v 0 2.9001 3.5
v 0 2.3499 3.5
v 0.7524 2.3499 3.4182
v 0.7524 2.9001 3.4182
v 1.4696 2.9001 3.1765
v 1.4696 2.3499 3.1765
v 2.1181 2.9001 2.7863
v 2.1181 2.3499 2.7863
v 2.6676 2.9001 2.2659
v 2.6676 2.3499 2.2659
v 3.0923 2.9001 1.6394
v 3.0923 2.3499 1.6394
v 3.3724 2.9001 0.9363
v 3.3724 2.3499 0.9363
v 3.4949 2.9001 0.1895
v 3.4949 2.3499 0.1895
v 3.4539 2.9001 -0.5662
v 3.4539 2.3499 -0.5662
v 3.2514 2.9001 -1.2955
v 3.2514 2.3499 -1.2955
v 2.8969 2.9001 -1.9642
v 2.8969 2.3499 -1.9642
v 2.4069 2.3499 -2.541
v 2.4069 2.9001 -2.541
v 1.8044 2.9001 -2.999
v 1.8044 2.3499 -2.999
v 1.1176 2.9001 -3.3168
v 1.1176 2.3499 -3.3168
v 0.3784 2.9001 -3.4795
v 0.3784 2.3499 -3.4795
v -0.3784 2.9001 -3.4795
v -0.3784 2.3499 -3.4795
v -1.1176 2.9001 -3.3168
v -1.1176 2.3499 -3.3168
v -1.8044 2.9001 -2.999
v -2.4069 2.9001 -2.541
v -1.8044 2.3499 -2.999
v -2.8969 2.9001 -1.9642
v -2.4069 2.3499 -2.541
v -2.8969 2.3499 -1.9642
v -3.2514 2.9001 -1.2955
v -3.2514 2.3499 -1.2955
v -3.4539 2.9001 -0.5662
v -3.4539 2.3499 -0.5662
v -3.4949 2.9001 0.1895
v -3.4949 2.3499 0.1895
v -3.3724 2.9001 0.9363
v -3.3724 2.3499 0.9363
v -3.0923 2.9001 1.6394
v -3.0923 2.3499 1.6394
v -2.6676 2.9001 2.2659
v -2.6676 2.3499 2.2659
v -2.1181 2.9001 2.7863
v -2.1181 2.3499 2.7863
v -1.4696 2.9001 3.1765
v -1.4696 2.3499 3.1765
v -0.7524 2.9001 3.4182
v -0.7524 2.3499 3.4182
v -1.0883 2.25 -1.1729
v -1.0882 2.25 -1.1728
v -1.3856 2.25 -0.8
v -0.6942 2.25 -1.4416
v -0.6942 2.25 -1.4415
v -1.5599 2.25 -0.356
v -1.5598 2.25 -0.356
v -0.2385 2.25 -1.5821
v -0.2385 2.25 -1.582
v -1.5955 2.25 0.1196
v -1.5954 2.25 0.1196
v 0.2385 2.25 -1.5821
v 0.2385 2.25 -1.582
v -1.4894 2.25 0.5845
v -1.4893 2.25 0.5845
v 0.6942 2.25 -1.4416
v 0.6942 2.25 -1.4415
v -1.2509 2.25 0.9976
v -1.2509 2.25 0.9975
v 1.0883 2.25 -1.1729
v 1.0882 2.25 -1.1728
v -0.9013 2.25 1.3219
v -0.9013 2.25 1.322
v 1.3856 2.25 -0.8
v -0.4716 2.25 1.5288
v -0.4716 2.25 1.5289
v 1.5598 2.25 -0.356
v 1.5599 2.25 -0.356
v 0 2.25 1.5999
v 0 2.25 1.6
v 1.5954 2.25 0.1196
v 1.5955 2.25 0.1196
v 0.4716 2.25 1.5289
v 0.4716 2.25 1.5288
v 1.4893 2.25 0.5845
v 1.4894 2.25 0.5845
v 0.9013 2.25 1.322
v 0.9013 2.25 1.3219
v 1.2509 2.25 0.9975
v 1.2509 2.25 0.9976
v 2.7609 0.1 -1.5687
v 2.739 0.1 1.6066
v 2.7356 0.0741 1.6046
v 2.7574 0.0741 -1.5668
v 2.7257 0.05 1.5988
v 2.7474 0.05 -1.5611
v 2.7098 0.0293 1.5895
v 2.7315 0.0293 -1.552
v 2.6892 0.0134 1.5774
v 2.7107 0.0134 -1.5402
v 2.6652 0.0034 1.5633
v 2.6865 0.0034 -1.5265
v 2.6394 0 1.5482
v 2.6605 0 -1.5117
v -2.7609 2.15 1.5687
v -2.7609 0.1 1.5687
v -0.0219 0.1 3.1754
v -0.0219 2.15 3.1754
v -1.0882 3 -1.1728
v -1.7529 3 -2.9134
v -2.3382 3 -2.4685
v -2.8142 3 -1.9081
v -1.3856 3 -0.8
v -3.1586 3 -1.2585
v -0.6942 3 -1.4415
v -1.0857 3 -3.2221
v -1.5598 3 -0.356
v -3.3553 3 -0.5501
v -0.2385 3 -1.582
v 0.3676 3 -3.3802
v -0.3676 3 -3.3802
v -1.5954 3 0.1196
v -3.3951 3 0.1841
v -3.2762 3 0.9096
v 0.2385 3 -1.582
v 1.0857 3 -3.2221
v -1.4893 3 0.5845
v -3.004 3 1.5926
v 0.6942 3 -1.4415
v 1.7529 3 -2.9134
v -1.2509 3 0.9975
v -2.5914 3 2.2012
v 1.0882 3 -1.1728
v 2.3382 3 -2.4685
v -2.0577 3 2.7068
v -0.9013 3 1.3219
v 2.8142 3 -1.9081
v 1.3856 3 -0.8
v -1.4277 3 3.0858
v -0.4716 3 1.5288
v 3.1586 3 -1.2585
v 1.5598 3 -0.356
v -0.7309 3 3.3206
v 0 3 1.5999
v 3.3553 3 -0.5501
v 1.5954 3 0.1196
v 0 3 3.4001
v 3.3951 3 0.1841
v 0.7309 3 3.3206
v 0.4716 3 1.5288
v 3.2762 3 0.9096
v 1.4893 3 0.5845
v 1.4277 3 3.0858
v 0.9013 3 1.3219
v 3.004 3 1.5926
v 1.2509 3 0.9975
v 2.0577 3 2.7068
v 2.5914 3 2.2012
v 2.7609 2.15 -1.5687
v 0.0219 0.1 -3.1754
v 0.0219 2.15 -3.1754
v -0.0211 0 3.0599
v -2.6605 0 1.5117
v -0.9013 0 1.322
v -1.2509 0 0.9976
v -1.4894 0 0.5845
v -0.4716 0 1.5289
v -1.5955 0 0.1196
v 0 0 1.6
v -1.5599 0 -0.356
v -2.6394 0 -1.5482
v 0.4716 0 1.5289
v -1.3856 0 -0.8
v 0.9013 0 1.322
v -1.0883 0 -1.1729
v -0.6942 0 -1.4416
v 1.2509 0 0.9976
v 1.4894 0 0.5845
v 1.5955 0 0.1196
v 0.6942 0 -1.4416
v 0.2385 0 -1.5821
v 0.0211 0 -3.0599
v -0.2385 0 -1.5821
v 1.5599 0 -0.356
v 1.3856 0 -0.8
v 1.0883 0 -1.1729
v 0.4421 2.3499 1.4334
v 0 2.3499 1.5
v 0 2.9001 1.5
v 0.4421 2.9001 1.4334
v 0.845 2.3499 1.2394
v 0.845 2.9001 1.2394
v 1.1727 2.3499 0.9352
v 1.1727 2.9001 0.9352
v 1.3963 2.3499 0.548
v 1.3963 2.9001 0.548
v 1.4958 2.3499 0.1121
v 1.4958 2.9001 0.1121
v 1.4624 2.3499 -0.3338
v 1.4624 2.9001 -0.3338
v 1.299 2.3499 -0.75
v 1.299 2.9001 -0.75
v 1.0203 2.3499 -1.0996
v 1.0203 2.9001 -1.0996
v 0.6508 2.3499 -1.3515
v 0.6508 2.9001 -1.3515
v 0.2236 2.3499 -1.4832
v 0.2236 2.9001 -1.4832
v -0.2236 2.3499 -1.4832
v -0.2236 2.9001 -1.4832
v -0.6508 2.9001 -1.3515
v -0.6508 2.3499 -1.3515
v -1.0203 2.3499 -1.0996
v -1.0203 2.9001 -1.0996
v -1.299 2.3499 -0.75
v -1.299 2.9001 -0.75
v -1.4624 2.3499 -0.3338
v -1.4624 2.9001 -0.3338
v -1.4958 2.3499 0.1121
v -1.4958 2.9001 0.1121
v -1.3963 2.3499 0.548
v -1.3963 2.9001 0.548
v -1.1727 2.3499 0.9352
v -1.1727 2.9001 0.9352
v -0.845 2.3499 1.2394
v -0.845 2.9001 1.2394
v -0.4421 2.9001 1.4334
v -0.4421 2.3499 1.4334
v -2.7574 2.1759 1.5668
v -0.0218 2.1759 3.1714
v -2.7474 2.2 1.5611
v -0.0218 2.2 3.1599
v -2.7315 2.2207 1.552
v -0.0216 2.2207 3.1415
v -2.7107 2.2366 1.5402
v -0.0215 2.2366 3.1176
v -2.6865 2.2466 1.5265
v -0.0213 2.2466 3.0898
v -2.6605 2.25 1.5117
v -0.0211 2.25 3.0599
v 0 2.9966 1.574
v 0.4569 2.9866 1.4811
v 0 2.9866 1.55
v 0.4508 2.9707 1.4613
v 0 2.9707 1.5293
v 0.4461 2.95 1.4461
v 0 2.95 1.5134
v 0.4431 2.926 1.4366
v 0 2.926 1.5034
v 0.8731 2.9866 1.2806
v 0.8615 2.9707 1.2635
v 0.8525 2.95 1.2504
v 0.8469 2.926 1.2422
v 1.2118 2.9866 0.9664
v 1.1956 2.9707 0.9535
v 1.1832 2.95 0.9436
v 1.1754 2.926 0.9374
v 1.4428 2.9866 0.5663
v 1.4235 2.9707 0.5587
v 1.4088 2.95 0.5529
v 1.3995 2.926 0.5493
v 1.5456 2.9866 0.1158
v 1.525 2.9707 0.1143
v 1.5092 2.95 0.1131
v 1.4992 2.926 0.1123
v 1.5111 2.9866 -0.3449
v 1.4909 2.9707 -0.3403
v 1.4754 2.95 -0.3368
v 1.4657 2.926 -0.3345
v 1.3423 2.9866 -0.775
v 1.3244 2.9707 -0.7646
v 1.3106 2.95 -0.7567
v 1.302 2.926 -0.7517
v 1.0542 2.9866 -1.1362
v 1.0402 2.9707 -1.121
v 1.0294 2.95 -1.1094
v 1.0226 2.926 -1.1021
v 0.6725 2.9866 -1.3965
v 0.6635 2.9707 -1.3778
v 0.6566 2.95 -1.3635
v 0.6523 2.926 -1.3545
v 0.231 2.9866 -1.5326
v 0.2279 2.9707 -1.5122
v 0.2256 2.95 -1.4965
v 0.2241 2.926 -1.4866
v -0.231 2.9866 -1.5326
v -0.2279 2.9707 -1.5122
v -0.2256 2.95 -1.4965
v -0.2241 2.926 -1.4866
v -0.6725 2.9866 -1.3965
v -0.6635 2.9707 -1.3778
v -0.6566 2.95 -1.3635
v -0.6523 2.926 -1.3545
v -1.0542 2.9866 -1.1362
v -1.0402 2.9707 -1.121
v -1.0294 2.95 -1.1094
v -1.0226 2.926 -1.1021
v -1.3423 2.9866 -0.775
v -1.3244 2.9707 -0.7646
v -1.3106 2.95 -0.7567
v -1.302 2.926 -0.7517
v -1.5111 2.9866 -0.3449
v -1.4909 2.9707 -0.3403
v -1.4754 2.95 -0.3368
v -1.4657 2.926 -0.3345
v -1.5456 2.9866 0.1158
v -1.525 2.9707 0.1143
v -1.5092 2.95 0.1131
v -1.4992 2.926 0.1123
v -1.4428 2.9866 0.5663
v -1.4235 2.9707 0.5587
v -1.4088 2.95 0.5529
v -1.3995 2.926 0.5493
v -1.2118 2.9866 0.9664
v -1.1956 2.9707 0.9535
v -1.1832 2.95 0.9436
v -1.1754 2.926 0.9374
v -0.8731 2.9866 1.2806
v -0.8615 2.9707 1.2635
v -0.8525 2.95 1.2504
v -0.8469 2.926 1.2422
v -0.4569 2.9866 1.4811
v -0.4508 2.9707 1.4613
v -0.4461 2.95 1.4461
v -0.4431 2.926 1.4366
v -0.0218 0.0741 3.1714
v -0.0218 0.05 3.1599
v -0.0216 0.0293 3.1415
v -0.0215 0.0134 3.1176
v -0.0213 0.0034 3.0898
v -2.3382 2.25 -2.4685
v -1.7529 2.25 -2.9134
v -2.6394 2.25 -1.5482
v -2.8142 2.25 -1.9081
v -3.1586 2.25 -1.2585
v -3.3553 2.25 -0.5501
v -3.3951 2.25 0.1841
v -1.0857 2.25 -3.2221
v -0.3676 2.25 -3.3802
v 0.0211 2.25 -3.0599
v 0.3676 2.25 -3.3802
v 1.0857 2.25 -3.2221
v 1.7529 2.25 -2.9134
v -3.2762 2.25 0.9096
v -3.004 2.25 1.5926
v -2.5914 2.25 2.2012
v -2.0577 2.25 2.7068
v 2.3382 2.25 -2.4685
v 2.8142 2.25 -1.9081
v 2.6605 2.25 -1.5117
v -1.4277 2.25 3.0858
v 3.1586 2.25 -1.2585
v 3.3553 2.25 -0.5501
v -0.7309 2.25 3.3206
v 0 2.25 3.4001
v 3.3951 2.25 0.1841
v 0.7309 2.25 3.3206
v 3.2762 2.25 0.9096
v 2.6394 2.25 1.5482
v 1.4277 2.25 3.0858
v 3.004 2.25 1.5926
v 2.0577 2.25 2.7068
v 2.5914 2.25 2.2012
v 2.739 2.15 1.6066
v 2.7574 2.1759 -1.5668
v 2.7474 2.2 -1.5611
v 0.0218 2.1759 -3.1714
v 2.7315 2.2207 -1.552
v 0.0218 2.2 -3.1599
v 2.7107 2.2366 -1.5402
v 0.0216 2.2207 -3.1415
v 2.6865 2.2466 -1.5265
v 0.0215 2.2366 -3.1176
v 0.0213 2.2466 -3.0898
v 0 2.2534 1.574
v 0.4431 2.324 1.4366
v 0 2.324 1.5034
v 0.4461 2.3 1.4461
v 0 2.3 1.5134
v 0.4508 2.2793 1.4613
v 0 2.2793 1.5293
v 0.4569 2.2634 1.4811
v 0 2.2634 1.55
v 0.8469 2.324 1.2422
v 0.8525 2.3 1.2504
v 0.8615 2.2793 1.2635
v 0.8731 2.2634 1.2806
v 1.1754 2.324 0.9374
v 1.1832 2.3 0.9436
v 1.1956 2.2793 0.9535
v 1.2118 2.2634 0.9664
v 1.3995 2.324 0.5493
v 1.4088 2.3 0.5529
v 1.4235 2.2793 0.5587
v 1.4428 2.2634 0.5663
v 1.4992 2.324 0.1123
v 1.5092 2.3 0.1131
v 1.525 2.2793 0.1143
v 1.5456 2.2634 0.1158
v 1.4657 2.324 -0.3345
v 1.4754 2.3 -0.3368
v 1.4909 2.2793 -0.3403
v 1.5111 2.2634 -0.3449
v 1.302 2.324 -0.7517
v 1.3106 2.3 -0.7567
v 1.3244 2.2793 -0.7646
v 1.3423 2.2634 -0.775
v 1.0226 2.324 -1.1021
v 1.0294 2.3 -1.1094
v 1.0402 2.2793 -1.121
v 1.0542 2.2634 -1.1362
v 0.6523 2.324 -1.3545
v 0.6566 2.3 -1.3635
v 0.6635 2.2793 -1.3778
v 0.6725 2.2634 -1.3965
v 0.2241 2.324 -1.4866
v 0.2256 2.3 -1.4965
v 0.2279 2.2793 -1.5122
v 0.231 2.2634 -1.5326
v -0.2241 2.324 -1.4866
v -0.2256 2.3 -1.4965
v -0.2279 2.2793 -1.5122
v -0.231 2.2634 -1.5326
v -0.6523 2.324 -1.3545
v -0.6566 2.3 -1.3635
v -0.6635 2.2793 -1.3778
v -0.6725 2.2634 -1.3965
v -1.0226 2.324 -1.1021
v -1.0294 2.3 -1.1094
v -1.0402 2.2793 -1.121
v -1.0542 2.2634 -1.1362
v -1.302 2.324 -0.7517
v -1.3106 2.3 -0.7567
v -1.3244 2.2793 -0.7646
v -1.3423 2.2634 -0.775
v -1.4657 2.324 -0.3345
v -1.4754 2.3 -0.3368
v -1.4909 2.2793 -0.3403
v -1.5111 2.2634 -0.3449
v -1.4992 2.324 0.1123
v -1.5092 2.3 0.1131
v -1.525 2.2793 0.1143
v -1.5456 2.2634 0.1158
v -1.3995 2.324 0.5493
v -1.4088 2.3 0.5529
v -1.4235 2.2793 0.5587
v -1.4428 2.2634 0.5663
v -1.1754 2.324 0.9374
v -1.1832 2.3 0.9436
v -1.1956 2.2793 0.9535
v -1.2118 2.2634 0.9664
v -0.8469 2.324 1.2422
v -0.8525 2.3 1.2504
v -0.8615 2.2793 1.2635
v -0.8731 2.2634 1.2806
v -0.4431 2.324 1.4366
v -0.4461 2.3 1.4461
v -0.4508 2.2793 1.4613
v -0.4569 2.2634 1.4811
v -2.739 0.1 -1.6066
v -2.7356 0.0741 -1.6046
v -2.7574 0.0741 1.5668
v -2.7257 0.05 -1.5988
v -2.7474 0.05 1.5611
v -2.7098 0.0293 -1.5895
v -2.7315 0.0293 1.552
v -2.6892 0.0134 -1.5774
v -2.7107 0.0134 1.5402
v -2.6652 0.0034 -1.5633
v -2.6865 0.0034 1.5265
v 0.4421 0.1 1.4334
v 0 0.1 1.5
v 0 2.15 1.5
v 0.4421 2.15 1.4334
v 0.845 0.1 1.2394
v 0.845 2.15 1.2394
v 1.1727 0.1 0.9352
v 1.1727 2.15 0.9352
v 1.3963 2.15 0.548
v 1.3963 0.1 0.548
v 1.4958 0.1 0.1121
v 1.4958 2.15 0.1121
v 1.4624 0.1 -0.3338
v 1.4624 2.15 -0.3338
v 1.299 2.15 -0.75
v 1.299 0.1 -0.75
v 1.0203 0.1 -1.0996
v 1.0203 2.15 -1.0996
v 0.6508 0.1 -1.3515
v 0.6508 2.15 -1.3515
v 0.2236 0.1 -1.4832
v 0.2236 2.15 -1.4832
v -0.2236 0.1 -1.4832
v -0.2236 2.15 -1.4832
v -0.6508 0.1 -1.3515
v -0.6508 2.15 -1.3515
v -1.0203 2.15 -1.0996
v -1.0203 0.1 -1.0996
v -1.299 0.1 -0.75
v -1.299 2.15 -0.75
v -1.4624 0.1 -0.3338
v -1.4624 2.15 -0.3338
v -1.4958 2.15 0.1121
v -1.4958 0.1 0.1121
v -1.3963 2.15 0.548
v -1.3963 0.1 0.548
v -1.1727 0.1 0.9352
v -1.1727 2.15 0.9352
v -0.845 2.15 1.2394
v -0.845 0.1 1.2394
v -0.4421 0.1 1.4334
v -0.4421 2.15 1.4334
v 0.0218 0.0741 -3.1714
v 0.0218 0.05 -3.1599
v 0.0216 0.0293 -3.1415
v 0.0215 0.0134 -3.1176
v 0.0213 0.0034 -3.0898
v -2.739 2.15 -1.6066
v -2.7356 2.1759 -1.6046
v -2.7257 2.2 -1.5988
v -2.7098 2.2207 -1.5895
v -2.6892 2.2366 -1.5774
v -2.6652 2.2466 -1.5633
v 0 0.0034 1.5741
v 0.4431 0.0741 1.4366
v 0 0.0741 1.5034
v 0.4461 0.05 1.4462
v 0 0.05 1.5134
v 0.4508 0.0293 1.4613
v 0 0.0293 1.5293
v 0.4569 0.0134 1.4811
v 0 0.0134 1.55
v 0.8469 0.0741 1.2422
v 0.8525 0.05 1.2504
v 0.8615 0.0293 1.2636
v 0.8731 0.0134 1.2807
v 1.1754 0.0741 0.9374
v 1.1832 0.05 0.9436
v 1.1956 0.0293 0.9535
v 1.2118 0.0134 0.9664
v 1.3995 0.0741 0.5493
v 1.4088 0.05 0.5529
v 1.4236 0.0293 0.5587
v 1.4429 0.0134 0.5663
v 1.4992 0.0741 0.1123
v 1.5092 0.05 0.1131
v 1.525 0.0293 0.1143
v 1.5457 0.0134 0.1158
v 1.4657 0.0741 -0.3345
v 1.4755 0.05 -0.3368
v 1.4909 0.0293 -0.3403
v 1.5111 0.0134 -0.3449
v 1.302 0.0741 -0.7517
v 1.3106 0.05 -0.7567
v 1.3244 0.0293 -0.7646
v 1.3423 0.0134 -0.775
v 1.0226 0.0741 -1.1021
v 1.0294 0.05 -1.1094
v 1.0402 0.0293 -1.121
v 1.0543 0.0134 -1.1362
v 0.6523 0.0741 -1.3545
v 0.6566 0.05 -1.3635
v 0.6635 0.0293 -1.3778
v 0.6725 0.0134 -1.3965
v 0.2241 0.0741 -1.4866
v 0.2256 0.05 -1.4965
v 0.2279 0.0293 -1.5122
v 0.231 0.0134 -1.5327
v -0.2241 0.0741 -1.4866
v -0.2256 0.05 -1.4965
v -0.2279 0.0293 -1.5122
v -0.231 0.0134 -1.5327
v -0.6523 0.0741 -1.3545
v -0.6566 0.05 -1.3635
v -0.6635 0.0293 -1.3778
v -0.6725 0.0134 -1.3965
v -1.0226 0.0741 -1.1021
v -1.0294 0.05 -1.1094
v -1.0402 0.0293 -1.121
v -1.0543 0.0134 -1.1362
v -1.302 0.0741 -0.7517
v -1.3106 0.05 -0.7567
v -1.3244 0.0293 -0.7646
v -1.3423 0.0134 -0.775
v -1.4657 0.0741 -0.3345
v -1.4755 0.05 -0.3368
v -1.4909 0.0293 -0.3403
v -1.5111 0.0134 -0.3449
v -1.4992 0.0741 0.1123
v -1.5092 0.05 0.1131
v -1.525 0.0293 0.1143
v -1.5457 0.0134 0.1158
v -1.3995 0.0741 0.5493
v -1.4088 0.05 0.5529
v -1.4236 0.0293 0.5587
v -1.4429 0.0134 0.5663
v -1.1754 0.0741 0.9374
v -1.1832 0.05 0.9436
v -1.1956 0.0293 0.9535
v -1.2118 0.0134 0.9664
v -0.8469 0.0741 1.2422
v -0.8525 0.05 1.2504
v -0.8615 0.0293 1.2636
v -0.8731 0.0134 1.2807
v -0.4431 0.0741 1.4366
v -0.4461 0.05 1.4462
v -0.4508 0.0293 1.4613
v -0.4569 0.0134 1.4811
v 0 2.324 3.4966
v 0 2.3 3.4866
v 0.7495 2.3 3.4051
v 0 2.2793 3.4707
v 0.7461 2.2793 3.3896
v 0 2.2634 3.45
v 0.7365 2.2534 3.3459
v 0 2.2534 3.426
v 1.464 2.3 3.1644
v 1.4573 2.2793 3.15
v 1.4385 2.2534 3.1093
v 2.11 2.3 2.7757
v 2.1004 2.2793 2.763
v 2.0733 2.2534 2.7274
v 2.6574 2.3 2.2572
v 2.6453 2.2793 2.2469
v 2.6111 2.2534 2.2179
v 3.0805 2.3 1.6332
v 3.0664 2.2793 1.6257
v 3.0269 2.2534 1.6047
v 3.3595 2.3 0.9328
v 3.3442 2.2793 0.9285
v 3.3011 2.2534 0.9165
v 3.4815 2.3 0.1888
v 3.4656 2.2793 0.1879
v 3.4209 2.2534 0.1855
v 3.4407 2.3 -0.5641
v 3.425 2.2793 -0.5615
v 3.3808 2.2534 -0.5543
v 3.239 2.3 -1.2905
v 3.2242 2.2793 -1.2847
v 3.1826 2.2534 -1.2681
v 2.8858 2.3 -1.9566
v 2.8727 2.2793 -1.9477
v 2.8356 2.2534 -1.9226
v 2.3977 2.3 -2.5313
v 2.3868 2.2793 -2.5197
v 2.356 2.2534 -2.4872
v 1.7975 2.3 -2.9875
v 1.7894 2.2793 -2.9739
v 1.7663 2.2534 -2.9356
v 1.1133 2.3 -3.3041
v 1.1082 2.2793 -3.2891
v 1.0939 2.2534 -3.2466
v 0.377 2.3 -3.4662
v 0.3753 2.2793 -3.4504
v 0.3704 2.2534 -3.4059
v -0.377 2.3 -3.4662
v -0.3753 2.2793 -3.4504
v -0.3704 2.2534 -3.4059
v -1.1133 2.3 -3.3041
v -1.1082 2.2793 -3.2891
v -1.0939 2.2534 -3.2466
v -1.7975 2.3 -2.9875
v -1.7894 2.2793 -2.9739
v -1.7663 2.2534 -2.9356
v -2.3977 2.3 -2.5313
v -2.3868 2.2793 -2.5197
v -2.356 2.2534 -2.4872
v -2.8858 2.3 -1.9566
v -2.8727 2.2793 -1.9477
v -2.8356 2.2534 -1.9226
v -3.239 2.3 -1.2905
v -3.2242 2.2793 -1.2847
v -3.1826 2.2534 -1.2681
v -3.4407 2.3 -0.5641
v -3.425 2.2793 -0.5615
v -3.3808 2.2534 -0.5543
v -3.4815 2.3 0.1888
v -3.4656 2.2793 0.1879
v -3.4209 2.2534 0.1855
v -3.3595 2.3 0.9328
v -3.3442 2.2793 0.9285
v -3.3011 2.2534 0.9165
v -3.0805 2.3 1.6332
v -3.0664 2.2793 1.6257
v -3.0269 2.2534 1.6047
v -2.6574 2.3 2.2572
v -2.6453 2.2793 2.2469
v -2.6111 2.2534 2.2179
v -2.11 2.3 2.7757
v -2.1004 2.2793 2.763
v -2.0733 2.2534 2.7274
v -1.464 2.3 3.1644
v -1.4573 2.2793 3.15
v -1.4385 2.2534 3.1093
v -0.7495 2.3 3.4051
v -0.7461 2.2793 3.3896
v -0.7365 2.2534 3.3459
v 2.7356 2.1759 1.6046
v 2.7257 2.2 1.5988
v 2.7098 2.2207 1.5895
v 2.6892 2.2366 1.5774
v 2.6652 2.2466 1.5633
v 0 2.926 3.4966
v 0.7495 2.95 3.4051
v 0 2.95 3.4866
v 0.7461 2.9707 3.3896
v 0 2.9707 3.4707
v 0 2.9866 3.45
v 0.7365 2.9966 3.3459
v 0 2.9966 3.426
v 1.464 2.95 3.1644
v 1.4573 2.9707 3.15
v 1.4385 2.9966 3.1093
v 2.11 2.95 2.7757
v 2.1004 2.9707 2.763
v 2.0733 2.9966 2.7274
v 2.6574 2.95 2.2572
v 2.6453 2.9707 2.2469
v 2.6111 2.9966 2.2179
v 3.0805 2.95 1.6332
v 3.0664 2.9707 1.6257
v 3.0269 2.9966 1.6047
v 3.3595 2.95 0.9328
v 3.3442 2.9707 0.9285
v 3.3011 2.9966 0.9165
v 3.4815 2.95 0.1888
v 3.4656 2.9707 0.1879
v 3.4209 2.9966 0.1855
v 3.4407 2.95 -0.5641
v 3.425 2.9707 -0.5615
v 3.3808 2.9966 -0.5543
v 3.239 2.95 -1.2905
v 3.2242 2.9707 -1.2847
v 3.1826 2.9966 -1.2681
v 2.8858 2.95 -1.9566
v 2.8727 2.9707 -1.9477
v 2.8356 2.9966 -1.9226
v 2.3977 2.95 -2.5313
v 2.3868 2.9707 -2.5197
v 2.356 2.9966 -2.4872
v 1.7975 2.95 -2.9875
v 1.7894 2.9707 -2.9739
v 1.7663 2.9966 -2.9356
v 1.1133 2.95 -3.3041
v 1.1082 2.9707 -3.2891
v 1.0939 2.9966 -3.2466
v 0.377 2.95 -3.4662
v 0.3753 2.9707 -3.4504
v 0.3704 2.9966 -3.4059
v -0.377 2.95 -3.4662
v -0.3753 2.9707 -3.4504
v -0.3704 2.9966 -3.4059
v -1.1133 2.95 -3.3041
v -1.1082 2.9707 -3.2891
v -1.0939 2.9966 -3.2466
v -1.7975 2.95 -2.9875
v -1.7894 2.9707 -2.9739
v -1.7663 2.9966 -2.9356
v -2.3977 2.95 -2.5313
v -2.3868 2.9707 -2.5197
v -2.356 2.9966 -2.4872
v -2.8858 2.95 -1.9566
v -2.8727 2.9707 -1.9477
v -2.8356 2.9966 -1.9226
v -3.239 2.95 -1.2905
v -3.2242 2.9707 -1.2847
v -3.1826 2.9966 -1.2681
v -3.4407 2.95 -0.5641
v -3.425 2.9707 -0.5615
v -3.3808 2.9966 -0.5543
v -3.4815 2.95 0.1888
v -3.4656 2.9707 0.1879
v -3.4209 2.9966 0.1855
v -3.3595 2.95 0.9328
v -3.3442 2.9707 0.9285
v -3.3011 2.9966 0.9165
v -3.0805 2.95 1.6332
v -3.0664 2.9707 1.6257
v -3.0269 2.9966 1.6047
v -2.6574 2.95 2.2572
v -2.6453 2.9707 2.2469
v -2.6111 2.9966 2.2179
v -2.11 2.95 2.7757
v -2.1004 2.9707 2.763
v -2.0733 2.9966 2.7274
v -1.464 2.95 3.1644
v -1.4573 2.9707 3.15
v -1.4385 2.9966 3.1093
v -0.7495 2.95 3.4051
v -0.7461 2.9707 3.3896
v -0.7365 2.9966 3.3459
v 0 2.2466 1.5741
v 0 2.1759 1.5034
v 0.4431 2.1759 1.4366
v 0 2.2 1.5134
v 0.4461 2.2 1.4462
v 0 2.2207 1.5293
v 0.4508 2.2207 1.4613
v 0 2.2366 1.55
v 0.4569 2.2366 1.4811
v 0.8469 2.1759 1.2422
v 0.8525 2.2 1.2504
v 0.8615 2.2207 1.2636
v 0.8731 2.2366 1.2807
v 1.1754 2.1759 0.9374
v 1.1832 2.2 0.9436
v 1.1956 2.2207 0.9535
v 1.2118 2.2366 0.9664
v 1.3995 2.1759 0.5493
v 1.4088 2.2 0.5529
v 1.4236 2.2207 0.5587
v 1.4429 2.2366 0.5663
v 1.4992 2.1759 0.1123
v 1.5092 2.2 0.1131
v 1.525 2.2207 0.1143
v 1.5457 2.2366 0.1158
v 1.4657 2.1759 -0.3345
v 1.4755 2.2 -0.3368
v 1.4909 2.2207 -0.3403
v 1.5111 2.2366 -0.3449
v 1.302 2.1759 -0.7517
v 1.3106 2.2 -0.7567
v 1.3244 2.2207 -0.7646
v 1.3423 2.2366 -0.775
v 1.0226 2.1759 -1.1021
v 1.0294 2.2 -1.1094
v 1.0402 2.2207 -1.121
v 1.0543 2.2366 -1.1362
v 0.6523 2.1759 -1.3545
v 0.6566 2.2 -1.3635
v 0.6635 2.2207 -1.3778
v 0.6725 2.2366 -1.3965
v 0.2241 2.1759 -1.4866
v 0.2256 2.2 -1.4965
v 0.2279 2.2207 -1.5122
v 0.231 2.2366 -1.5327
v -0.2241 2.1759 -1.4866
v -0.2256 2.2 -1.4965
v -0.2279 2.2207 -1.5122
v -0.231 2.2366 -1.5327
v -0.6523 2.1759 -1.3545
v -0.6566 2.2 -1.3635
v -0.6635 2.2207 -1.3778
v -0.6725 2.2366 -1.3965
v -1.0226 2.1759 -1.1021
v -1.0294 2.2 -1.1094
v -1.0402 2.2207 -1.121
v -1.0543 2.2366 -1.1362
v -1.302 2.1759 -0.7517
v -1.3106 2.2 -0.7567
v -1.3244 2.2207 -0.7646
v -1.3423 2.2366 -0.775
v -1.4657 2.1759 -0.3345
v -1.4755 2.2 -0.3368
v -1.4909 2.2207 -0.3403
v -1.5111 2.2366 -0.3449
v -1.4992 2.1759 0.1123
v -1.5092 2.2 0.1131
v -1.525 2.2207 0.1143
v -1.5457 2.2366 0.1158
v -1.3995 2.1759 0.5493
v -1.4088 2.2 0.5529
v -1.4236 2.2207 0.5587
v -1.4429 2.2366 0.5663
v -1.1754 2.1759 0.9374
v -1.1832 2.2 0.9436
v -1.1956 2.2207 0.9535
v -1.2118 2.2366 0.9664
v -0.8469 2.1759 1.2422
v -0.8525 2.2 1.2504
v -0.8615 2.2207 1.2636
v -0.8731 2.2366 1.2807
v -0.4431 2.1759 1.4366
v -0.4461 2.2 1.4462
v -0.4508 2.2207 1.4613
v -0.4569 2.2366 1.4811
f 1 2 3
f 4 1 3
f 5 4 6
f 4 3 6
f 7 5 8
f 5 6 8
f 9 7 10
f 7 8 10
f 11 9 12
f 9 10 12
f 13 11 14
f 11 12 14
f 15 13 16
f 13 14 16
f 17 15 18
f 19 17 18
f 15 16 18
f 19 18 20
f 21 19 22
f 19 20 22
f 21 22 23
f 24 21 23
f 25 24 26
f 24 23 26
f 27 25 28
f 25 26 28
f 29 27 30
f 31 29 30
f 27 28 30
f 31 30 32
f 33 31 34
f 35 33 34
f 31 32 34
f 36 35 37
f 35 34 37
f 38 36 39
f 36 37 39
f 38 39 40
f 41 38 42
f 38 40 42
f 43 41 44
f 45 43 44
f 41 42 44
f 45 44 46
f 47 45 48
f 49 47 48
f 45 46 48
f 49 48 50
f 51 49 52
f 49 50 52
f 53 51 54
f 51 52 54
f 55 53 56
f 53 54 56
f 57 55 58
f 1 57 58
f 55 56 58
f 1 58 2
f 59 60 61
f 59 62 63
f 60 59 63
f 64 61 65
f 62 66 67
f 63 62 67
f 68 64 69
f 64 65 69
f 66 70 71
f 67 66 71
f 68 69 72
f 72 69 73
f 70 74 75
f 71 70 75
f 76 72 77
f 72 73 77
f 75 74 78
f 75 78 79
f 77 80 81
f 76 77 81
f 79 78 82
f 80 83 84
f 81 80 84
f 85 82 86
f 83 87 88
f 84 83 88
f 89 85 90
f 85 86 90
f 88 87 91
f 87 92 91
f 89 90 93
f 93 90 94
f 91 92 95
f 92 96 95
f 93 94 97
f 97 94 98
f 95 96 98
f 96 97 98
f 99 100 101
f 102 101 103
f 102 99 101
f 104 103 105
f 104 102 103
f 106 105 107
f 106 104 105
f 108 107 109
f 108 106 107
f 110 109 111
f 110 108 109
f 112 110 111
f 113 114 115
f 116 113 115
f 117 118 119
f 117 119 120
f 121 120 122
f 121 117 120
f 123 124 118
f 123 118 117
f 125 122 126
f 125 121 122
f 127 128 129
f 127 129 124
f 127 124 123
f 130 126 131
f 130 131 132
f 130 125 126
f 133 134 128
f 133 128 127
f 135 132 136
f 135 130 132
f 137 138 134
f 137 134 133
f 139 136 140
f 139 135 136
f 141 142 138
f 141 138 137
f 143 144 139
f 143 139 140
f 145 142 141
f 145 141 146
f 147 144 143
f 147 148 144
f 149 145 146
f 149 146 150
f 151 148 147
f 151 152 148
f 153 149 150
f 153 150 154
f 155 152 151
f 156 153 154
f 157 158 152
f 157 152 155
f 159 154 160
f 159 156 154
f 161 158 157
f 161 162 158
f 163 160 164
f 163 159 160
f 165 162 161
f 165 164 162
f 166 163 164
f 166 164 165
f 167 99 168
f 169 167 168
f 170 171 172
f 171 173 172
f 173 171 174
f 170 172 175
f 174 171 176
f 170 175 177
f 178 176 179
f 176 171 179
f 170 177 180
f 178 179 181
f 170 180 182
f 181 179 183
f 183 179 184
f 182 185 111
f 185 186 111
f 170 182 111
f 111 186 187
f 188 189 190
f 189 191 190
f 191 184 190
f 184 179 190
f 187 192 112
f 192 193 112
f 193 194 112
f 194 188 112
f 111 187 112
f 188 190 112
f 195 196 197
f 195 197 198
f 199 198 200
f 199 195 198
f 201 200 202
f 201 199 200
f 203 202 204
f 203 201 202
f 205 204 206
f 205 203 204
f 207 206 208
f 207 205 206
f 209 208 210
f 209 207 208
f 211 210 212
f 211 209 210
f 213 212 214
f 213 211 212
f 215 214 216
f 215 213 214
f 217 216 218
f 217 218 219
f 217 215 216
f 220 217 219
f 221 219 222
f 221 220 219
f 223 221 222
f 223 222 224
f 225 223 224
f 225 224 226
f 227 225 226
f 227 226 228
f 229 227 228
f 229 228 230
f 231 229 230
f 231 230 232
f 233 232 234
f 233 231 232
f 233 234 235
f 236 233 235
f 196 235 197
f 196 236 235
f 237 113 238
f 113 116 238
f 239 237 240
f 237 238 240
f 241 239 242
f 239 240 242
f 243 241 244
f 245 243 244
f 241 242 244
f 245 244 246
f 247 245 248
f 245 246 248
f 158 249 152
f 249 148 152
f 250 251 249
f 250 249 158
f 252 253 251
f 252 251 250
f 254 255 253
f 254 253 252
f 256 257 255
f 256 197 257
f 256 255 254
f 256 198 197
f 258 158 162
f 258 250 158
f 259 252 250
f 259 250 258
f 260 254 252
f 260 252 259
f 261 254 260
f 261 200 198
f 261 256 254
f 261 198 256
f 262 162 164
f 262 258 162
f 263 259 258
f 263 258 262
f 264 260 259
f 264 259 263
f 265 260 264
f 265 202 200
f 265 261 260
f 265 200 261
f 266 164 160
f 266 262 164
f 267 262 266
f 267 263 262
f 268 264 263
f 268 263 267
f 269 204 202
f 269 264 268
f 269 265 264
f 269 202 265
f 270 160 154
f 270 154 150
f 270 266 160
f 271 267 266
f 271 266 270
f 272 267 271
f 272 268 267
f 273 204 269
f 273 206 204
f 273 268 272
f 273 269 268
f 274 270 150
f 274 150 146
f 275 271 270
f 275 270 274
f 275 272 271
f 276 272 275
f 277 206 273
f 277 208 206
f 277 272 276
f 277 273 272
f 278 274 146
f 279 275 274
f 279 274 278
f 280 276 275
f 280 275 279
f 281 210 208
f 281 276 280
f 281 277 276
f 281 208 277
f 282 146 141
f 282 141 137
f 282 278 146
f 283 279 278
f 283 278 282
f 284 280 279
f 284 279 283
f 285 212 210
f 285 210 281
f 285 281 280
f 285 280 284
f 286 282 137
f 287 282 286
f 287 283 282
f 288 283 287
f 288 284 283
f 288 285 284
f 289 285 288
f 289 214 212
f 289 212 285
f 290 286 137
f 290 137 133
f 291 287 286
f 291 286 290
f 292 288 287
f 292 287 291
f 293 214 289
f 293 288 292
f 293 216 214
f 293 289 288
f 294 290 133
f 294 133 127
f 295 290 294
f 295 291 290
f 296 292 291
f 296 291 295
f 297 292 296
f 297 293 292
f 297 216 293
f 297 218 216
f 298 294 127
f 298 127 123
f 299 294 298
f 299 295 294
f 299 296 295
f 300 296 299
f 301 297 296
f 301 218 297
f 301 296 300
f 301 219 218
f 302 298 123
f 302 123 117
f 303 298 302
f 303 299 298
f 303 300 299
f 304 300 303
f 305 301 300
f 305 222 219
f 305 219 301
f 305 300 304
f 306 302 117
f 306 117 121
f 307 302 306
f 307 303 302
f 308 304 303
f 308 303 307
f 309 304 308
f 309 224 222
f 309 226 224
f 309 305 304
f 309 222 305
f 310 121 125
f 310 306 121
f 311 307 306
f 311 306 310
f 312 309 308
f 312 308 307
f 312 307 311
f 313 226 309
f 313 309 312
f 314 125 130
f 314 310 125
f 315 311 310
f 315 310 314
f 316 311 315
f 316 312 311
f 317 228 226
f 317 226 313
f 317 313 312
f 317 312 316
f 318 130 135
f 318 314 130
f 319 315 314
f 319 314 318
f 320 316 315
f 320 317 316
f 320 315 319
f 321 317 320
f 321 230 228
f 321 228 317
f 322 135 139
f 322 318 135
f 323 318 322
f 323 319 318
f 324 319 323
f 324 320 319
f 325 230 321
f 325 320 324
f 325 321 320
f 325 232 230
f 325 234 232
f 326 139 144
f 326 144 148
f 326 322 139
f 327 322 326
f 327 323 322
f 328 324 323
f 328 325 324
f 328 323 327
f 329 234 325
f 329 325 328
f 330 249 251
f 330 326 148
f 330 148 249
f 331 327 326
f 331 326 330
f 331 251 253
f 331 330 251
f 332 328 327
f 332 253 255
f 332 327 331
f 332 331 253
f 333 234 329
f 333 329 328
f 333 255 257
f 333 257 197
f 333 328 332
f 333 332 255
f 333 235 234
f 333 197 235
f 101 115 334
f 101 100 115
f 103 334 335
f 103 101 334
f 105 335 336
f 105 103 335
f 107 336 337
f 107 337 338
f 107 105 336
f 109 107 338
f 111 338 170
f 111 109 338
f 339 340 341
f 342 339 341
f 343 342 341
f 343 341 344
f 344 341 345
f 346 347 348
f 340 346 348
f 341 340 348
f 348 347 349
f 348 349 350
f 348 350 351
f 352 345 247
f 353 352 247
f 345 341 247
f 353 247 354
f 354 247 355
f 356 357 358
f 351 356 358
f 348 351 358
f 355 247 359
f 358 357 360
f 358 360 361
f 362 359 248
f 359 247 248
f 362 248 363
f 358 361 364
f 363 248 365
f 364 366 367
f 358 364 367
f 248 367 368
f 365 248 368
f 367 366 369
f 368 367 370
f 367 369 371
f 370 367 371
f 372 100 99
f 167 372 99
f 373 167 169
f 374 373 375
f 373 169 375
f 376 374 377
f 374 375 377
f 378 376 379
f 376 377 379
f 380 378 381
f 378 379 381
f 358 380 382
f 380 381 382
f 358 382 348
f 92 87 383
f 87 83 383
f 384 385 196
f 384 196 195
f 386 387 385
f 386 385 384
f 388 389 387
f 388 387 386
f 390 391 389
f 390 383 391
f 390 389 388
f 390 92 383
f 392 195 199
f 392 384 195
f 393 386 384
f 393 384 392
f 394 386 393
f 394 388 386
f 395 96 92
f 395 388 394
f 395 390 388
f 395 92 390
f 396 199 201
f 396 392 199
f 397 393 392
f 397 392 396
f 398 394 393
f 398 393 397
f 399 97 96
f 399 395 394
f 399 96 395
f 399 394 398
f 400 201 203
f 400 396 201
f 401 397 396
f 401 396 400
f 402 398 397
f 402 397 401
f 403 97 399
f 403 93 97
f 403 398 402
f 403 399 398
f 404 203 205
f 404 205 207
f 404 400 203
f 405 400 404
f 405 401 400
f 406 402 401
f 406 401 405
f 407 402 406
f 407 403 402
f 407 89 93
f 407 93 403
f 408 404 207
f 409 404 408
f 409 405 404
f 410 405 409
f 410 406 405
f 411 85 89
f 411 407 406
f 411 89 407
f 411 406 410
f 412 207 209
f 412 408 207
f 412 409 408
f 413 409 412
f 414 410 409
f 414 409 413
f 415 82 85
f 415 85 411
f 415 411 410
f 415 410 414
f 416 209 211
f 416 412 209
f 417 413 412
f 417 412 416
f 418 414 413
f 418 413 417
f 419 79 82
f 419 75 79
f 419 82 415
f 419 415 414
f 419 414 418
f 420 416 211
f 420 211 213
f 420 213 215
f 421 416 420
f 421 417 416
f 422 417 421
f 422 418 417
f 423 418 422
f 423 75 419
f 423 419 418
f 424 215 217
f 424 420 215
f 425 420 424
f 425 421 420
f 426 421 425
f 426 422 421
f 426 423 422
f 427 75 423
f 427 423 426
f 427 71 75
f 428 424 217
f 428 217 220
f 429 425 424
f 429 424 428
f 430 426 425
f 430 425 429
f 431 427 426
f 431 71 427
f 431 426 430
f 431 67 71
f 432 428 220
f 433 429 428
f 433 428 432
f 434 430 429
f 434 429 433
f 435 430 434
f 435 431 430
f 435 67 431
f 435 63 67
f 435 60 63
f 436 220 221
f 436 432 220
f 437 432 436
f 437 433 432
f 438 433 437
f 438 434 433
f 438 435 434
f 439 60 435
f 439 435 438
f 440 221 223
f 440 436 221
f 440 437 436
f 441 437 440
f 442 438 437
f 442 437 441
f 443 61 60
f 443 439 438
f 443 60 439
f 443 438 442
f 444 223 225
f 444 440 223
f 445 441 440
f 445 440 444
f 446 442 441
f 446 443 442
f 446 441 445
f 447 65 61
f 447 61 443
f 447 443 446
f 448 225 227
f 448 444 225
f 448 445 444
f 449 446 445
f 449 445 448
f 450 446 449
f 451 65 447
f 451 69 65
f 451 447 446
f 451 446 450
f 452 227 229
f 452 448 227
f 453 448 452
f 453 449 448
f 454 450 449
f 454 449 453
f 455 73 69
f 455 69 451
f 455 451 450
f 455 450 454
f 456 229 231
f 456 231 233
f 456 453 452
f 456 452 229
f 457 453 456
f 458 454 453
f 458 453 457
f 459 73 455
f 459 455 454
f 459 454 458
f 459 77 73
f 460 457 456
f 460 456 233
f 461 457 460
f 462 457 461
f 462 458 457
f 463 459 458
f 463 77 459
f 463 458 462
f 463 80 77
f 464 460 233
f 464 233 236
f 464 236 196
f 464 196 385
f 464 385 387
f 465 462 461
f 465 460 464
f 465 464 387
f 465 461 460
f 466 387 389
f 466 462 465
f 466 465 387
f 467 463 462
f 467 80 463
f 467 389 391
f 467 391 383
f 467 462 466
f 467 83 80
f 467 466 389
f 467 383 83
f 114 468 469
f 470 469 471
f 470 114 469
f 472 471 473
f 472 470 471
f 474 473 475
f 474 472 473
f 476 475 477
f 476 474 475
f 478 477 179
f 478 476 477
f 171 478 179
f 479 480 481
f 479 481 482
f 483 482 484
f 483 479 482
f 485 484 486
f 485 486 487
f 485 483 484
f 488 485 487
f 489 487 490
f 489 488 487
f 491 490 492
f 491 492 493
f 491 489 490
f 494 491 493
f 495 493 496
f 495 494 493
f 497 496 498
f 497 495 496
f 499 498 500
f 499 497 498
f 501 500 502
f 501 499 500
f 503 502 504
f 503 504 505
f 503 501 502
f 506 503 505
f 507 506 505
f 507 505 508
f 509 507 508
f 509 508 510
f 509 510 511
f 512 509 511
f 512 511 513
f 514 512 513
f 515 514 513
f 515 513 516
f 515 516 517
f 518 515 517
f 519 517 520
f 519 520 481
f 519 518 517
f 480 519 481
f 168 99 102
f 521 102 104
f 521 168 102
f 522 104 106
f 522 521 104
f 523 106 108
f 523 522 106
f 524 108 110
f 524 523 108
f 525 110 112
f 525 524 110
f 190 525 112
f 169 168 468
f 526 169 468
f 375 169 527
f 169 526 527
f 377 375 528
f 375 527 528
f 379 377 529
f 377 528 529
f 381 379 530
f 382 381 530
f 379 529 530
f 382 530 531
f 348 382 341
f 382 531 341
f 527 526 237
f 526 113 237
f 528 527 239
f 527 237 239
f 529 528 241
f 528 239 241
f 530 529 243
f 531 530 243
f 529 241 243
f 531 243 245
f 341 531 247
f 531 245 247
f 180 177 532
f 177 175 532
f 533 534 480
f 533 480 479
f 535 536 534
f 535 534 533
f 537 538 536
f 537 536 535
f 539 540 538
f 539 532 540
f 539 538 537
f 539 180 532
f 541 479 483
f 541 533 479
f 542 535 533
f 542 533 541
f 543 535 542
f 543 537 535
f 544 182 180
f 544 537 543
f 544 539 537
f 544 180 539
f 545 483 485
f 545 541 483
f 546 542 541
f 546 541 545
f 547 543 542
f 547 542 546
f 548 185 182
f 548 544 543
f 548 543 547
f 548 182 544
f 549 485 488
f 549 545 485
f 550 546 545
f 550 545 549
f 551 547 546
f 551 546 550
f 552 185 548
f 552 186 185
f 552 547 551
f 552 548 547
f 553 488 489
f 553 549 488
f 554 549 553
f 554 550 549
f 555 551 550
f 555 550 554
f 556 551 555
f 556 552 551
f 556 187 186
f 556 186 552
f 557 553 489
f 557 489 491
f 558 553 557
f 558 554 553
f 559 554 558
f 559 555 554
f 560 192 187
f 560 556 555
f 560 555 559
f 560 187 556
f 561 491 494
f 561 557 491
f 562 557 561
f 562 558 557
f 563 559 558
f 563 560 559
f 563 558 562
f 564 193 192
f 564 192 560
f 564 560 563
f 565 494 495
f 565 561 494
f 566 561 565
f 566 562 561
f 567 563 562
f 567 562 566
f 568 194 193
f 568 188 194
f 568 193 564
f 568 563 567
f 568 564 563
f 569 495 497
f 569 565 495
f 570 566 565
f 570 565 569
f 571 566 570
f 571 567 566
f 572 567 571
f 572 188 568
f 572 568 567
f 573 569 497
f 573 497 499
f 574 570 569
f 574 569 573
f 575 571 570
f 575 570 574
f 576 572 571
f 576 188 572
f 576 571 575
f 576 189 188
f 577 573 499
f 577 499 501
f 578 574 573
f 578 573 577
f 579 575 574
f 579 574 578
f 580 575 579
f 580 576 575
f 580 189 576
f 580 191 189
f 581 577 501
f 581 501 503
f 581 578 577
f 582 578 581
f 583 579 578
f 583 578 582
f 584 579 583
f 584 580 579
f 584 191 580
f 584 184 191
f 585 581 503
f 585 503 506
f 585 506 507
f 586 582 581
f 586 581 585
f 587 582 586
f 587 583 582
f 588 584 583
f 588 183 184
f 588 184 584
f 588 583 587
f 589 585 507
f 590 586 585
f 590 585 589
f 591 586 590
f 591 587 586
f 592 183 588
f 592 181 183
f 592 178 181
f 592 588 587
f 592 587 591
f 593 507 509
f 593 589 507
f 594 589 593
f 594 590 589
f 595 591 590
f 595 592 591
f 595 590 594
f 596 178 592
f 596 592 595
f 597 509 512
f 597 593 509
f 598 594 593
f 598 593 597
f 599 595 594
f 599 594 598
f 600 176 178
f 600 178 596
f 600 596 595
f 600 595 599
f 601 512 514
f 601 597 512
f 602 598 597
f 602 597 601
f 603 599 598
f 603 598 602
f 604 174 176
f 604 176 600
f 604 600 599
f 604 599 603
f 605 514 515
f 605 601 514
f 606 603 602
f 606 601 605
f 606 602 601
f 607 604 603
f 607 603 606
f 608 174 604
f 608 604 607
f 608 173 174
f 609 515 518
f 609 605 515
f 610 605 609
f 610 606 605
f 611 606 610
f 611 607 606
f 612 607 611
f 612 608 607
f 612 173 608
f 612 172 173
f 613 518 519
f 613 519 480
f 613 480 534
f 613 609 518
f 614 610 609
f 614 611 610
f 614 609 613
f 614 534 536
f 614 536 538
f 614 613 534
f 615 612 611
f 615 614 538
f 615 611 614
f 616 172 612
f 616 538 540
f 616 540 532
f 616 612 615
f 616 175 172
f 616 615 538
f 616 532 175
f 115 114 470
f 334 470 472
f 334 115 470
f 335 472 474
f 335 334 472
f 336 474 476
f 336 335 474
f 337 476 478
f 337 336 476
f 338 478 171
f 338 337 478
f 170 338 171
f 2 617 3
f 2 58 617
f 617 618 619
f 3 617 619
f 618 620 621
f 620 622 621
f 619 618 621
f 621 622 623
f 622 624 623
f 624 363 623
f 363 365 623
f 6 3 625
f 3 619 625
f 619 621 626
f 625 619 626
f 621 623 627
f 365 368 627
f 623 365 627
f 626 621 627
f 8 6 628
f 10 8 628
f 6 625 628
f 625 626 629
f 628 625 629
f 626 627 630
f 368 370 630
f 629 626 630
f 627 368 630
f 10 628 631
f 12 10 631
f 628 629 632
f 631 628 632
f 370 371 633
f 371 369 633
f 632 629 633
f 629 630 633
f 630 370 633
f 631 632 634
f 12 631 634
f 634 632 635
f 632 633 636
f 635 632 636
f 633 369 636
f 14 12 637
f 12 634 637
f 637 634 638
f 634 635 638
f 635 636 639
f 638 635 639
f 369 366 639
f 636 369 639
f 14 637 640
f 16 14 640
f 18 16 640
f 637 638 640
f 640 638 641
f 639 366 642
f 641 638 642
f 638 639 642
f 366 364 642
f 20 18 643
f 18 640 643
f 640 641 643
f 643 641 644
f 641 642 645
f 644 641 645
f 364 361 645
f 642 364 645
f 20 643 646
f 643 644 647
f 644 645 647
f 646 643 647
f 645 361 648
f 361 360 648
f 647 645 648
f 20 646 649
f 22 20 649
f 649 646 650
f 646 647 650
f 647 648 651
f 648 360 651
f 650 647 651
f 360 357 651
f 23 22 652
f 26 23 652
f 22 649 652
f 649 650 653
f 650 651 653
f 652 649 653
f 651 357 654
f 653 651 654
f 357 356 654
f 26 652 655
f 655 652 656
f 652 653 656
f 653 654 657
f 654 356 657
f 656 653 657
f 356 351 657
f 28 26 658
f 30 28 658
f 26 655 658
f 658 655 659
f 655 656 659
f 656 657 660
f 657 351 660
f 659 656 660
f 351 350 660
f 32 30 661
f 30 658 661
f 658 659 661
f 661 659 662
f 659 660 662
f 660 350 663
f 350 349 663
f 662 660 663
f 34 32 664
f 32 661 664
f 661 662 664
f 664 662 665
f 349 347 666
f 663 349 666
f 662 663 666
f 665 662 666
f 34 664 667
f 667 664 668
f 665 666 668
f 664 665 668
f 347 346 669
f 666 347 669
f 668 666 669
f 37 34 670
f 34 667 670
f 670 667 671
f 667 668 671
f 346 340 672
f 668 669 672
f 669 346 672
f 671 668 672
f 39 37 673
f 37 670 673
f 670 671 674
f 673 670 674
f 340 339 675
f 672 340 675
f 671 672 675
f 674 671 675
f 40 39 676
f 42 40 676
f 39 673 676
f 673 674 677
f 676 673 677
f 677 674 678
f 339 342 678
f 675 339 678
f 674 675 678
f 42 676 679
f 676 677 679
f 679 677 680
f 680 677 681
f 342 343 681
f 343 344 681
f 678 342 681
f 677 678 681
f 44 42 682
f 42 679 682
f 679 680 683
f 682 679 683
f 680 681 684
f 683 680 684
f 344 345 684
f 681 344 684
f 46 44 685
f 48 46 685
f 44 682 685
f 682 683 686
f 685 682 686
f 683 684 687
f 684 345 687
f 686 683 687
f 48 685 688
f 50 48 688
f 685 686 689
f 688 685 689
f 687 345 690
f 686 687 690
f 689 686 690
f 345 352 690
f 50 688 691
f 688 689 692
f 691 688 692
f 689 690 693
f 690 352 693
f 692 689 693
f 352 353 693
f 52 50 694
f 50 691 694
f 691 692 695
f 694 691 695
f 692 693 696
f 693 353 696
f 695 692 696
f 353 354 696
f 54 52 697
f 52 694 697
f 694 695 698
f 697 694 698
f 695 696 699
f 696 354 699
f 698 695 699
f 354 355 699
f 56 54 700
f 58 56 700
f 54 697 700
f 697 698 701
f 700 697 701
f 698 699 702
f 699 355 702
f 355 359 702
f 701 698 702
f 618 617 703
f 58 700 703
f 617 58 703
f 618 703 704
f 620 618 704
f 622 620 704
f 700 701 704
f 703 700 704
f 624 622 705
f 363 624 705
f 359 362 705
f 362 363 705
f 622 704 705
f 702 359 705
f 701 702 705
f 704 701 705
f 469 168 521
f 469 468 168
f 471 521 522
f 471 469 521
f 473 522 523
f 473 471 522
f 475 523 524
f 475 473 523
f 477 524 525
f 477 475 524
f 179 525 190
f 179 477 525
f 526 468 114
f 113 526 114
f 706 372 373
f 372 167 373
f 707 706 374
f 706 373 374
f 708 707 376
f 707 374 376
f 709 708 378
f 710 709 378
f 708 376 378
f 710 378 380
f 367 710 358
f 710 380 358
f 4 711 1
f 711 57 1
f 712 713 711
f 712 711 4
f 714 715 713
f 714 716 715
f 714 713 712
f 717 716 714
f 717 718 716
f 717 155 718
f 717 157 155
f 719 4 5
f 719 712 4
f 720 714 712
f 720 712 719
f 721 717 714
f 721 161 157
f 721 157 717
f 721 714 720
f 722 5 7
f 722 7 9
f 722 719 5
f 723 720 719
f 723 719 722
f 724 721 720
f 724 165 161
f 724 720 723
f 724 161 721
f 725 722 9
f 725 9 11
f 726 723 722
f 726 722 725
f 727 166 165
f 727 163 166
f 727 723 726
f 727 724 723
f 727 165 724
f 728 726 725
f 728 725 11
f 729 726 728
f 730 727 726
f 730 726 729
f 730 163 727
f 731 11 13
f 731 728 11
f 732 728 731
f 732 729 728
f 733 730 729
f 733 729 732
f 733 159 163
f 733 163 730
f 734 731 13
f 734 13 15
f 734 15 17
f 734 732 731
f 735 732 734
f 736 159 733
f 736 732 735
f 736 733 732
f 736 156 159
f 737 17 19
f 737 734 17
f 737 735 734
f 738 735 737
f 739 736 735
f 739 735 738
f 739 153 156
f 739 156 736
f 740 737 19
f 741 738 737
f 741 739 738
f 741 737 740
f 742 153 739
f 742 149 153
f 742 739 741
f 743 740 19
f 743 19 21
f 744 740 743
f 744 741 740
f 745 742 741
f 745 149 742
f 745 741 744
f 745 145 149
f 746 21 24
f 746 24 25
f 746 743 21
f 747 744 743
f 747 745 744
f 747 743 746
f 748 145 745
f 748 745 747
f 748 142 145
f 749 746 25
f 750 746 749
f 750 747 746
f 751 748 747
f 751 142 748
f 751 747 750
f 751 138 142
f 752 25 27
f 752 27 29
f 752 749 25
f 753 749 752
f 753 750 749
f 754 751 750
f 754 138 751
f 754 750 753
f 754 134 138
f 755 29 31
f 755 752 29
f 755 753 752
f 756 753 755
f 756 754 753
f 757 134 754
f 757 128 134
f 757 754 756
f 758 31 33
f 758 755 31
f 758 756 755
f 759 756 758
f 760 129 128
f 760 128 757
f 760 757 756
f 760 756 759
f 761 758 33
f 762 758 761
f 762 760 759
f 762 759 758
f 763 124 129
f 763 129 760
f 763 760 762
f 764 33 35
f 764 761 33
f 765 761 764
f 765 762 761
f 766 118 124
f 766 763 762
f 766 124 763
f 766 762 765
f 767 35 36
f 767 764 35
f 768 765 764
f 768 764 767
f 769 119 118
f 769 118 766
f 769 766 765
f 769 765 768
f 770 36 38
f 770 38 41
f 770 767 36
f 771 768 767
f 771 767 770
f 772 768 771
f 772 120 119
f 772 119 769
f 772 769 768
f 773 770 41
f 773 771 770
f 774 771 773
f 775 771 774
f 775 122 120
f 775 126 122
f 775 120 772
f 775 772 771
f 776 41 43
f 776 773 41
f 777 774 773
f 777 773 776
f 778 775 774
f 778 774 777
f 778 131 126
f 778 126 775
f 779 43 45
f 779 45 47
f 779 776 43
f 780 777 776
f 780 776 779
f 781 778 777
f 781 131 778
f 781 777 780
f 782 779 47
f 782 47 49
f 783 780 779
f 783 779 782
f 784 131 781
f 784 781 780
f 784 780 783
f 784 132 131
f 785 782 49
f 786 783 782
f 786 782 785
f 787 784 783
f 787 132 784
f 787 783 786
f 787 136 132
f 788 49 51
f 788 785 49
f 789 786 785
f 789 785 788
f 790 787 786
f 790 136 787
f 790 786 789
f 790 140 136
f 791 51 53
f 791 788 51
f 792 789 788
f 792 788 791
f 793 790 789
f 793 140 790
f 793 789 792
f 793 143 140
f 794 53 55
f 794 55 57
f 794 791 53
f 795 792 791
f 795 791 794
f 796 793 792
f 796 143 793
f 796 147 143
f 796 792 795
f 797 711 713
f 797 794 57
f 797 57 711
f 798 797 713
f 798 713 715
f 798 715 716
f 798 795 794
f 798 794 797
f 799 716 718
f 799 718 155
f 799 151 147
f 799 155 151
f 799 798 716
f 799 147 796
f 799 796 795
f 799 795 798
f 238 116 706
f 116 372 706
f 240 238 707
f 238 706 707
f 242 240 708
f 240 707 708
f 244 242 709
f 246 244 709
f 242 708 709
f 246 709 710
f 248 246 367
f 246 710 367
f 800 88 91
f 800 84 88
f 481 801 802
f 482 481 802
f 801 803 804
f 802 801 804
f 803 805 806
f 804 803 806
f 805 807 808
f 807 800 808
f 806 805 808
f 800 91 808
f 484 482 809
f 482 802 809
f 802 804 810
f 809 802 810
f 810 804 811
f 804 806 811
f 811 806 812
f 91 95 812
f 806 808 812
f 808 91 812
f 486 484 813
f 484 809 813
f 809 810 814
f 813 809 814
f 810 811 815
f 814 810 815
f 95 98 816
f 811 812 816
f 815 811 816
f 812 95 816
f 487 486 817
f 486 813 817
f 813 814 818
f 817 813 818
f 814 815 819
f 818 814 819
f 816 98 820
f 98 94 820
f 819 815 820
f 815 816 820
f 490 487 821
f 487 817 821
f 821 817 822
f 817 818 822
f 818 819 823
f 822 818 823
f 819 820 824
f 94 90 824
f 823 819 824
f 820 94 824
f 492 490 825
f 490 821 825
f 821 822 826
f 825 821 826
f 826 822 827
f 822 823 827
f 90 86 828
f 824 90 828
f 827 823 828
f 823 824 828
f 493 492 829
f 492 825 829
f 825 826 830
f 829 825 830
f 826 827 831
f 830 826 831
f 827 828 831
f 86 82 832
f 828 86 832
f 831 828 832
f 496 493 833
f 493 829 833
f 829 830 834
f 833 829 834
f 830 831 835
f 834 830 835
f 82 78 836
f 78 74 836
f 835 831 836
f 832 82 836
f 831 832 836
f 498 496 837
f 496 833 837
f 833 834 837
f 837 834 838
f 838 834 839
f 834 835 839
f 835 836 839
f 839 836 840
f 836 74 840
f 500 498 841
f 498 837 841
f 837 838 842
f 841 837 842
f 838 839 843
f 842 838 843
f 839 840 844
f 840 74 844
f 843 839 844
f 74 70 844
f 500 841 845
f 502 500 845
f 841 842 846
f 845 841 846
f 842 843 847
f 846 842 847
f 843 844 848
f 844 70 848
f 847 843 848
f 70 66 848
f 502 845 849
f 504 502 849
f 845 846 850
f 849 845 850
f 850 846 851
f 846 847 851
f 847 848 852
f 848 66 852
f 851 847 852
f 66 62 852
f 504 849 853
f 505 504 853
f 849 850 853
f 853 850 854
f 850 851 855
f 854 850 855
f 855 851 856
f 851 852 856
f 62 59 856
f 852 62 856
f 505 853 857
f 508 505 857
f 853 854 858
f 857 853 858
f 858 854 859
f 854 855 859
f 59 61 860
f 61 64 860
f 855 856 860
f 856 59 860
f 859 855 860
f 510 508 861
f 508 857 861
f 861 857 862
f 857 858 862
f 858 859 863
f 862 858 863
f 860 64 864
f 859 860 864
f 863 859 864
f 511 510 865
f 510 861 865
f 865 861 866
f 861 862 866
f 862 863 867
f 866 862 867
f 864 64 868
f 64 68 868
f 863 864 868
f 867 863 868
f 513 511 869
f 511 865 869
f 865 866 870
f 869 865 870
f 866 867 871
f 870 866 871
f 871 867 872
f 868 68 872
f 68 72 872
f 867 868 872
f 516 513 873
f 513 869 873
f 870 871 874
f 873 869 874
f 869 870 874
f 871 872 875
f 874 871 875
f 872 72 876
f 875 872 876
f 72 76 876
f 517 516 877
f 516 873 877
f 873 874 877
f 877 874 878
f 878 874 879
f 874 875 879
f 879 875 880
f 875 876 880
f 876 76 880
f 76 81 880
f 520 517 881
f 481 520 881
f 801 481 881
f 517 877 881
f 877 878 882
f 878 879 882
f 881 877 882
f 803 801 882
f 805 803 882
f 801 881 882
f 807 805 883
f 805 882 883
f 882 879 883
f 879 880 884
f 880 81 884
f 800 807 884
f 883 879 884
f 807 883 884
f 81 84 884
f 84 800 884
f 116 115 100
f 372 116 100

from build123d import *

# Parameters (mm, degrees)
SKETCH1_R           = 1.5
BOSS_EXTRUDE1_DEPTH = 2.25
FILLET1_R           = 0.1
SKETCH2_R           = 3.5
SKETCH2_R_2         = 1.5
BOSS_EXTRUDE2_DEPTH = 0.75
FILLET2_R           = 0.1


with BuildPart() as part:
    # Sketch1 → Boss-Extrude1 (new body)
    with BuildSketch(Plane(origin=(0, 0, 0), x_dir=(1, 0, 0), z_dir=(0, 1, 0))):
        Polygon((2.739003368, -1.606609438), (2.760866271, 1.568741778), (0.021862903, 3.175351216), (-2.739003368, 1.606609438), (-2.760866271, -1.568741778), (-0.021862903, -3.175351216), align=None)
        with Locations(Location((0, 0, 0), (0, 0, 270))):
            Circle(SKETCH1_R, mode=Mode.SUBTRACT)
    extrude(amount=BOSS_EXTRUDE1_DEPTH)

    # Fillet1
    fillet1_edges = [part.edges().sort_by_distance(p)[0] for p in [
        (1.391364587, 2.25, -2.372046497),
        (-1.358570232, 2.25, -2.390980327),
        (-2.749934819, 2.25, -0.01893383),
        (0, 0, -1.5),
        (0, 2.25, -1.5),
        (-1.391364587, 2.25, 2.372046497),
        (1.358570232, 2.25, 2.390980327),
        (-1.391364587, 0, 2.372046497),
        (-2.749934819, 0, -0.01893383),
        (-1.358570232, 0, -2.390980327),
        (2.749934819, 2.25, 0.01893383),
        (1.391364587, 0, -2.372046497),
        (2.749934819, 0, 0.01893383),
        (1.358570232, 0, 2.390980327),
    ]]
    fillet(fillet1_edges, radius=FILLET1_R)

    # Sketch2 → Boss-Extrude2 (add)
    with BuildSketch(Plane(origin=(0, 2.25, 0), x_dir=(1, 0, 0), z_dir=(0, 1, 0))):
        with Locations(Location((0, 0, 0), (0, 0, 270))):
            Circle(SKETCH2_R)
        with Locations(Location((0, 0, 0), (0, 0, 270))):
            Circle(SKETCH2_R_2, mode=Mode.SUBTRACT)
    extrude(amount=BOSS_EXTRUDE2_DEPTH)

    # Fillet2
    fillet2_edges = [part.edges().sort_by_distance(p)[0] for p in [
        (0, 2.25, -1.5),
        (0, 3, -3.5),
        (0, 2.25, -3.5),
        (0, 3, -1.5),
    ]]
    fillet(fillet2_edges, radius=FILLET2_R - 0.0001)  # a hair under: the kernel refuses the full size


solid = part.part
